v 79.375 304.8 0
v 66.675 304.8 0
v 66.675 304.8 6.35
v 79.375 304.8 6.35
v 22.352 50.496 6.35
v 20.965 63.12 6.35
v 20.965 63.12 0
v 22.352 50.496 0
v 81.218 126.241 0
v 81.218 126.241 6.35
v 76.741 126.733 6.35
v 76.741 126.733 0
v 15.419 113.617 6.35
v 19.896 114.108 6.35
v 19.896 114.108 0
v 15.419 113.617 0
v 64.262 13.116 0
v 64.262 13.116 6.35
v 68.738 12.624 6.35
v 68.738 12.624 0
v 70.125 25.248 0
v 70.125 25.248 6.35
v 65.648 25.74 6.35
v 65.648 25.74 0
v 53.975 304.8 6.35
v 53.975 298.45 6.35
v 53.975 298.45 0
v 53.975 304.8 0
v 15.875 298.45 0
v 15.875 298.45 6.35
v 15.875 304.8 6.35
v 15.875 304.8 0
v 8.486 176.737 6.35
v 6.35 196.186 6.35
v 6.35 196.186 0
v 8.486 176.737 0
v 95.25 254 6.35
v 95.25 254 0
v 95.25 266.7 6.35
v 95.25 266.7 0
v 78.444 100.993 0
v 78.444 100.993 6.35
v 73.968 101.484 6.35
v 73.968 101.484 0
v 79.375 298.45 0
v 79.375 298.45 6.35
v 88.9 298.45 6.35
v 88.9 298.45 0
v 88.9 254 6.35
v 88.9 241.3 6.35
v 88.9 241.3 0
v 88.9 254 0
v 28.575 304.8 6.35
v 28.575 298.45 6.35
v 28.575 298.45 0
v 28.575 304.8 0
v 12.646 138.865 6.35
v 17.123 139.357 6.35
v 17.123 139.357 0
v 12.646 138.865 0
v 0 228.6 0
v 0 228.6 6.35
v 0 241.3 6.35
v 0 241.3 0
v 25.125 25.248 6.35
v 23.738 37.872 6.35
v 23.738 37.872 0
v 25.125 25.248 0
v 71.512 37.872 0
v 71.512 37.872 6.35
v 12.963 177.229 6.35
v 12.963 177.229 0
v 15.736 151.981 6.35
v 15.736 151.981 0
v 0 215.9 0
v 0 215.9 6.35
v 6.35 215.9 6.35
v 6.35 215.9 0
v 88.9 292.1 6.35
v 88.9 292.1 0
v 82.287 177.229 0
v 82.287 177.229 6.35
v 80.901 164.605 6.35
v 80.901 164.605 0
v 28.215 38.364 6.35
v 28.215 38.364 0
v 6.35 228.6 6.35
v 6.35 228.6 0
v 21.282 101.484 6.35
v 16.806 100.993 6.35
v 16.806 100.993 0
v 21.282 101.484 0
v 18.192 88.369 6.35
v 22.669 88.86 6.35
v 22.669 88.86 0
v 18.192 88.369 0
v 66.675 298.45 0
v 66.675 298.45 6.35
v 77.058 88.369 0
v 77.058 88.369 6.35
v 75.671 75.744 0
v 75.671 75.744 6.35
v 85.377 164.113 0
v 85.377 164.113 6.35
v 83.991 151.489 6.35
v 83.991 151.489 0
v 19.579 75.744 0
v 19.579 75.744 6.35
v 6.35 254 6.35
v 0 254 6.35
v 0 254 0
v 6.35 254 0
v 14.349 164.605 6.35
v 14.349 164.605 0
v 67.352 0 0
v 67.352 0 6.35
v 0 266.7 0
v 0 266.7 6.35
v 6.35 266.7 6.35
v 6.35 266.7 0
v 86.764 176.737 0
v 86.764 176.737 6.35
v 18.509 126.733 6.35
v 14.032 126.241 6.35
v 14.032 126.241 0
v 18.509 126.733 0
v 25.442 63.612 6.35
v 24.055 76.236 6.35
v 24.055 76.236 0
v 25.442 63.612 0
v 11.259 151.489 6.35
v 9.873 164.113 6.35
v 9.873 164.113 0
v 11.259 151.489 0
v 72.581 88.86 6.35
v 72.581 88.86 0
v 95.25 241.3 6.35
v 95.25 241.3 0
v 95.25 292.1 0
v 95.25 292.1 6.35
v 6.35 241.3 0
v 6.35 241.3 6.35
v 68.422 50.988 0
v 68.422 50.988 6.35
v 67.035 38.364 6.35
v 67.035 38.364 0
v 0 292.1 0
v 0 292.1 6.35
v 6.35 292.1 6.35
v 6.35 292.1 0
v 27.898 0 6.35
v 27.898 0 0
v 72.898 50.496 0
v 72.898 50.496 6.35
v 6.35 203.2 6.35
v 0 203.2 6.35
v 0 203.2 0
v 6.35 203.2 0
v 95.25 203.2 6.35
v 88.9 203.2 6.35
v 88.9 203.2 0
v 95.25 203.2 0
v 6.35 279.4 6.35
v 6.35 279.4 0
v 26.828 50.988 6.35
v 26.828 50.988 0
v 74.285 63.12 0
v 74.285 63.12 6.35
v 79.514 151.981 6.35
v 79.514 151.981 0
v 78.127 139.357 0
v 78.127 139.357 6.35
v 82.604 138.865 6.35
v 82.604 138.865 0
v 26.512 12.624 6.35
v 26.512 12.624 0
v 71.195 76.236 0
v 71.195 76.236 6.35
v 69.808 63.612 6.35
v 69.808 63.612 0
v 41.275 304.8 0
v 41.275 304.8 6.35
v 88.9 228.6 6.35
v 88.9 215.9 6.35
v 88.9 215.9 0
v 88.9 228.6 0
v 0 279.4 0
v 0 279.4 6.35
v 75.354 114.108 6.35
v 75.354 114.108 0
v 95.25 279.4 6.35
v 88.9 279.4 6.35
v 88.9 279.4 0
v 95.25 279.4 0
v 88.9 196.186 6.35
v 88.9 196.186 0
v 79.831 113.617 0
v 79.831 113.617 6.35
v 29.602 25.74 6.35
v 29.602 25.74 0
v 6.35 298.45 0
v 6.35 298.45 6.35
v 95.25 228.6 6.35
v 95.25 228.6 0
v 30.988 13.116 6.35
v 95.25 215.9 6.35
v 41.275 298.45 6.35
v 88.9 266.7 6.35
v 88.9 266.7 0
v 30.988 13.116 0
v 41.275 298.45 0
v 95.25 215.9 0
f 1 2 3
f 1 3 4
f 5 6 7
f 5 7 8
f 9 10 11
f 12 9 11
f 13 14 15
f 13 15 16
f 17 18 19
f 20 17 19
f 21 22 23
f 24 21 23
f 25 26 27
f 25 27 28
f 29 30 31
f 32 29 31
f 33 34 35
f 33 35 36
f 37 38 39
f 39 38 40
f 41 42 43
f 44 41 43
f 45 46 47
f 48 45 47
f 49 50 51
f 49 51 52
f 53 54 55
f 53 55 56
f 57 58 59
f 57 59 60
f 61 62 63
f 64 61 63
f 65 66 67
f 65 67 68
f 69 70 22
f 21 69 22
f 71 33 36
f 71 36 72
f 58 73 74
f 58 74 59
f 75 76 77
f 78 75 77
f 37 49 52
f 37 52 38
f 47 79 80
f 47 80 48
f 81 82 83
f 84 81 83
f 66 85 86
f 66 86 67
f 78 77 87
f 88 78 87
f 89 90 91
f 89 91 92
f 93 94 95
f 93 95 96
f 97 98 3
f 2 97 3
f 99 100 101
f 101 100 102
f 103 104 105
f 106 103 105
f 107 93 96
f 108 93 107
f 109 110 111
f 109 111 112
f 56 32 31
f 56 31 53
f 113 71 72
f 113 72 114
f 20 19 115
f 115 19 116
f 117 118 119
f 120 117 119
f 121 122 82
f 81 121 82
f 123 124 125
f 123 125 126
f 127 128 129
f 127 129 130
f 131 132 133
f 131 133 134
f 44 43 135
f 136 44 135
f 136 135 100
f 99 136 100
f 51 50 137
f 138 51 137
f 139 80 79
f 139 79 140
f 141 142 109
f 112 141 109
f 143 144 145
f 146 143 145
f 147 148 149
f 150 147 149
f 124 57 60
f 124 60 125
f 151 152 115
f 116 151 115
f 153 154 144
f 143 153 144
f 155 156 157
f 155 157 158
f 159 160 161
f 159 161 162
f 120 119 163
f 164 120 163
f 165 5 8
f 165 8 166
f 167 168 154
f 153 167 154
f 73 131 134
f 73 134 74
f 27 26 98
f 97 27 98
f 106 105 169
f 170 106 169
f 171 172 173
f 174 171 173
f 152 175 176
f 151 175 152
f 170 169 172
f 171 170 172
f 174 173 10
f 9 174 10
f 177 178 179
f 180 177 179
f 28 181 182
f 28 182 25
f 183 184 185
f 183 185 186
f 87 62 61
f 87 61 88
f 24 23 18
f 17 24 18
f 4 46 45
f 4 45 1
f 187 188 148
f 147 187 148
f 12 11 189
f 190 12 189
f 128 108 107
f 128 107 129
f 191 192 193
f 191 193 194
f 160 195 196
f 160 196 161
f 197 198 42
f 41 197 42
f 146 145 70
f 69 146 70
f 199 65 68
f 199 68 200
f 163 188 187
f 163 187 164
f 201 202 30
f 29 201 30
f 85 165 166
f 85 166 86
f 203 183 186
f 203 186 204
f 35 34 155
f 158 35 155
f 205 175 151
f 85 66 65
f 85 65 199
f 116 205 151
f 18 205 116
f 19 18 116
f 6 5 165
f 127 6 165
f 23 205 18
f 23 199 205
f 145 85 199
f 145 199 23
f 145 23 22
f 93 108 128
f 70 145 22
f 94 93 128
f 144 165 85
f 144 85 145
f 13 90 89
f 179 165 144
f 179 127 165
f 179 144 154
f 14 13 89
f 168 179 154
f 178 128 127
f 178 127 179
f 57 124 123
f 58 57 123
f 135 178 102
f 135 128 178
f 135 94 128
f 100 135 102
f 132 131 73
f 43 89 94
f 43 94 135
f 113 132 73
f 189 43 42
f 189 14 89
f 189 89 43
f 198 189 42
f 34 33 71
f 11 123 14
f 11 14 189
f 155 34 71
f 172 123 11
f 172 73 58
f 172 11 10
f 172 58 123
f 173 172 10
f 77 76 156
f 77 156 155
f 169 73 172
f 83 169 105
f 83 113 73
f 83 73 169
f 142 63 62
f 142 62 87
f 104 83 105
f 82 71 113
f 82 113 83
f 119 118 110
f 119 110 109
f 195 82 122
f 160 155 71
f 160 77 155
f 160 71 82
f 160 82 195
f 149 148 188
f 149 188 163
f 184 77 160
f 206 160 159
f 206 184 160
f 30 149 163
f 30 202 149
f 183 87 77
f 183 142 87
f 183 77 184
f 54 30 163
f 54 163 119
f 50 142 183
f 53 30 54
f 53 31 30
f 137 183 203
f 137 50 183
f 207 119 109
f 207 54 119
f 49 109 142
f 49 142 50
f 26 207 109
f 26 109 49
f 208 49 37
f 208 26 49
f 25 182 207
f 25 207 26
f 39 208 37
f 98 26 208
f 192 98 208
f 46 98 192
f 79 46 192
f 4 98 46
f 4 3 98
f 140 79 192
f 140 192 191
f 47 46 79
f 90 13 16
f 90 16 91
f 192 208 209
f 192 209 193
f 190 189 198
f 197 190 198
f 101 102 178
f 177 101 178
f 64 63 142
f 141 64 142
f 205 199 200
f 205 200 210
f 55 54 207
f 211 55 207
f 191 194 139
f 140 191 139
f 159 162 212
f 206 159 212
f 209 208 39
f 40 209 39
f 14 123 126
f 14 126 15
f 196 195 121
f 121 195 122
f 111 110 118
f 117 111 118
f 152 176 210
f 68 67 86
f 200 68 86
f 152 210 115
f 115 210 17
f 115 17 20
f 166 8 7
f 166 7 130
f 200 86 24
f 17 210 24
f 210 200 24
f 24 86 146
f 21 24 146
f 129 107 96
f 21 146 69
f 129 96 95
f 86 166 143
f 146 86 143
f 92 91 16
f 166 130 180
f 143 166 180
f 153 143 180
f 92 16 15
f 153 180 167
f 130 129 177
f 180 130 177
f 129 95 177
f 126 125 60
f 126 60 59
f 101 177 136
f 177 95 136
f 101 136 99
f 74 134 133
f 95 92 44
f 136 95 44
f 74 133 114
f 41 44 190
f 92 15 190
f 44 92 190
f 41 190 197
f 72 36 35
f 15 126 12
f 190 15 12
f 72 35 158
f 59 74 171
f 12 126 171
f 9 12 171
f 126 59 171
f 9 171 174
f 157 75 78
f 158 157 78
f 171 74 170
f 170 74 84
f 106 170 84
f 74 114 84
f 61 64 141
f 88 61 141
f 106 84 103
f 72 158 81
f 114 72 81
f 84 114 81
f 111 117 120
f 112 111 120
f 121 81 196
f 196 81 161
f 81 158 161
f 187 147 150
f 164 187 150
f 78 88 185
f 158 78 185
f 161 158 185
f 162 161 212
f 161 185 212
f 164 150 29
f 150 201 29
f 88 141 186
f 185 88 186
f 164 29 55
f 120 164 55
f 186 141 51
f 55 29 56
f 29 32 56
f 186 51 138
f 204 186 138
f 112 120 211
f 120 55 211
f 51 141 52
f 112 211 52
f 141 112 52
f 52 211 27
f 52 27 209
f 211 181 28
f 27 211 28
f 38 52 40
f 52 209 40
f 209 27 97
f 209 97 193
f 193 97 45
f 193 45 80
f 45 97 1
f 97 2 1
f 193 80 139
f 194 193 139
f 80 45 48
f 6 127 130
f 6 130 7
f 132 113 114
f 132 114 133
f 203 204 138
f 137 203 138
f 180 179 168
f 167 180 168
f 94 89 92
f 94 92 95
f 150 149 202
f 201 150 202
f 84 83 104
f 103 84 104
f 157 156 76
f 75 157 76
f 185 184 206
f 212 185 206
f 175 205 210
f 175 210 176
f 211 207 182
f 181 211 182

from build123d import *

# Parameters (mm, degrees)
SKETCH1_W           = 95.25
SKETCH1_H           = 304.8
BOSS_EXTRUDE1_DEPTH = 6.35
CUT_EXTRUDE1_DEPTH  = 7.35
SKETCH3_W           = 6.35
SKETCH3_H           = 12.7
CUT_EXTRUDE2_DEPTH  = 7.35
SKETCH4_W           = 9.525
SKETCH4_H           = 6.35
SKETCH4_W_2         = 12.7
CUT_EXTRUDE3_DEPTH  = 7.35
CUT_EXTRUDE4_DEPTH  = 7.35
LPATTERN2_COUNT     = 7
LPATTERN2_PITCH     = 25.4
CUT_EXTRUDE5_DEPTH  = 7.35
LPATTERN3_COUNT     = 7
LPATTERN3_PITCH     = 25.4
SKETCH9_W           = 6.35
SKETCH9_H           = 57.814016323
BOSS_EXTRUDE2_DEPTH = 6.35
LPATTERN4_COUNT     = 5
LPATTERN4_PITCH     = 25.4


with BuildPart() as part:
    # Sketch1 → Boss-Extrude1 (new body)
    with BuildSketch(Plane.XY):
        with Locations((47.625, 152.4)):
            Rectangle(SKETCH1_W, SKETCH1_H)
    extrude(amount=BOSS_EXTRUDE1_DEPTH)

    # Sketch2 → Cut-Extrude1 (cut, through all)
    with BuildSketch(Plane.XY.offset(6.35)):
        Polygon((0, 254), (27.898079092, 0), (0, 0), align=None)
        Polygon((67.351920908, 0), (95.25, 0), (95.25, 254), align=None)
    extrude(amount=-CUT_EXTRUDE1_DEPTH, mode=Mode.SUBTRACT)

    # Sketch3 → Cut-Extrude2 (cut, through all)
    with BuildSketch(Plane.XY.offset(6.35)):
        with Locations((3.175, 298.45)):
            Rectangle(SKETCH3_W, SKETCH3_H)
        with Locations((92.075, 298.45)):
            Rectangle(SKETCH3_W, SKETCH3_H)
    cut_extrude2 = extrude(amount=-CUT_EXTRUDE2_DEPTH, mode=Mode.SUBTRACT)

    # Sketch4 → Cut-Extrude3 (cut, through all)
    with BuildSketch(Plane.XY.offset(6.35)):
        with Locations((11.1125, 301.625)):
            Rectangle(SKETCH4_W, SKETCH4_H)
        with Locations((34.925, 301.625)):
            Rectangle(SKETCH4_W_2, SKETCH4_H)
        with Locations((60.325, 301.625)):
            Rectangle(SKETCH4_W_2, SKETCH4_H)
        with Locations((84.1375, 301.625)):
            Rectangle(SKETCH4_W, SKETCH4_H)
    extrude(amount=-CUT_EXTRUDE3_DEPTH, mode=Mode.SUBTRACT)

    # Sketch5 → Cut-Extrude4 (cut, through all)
    with BuildSketch(Plane.XY.offset(6.35)):
        Polygon((26.511513632, 12.624081599), (25.124948171, 25.248163198), (29.601595278, 25.739855541), (30.988160739, 13.115773942), align=None)
    cut_extrude4 = extrude(amount=-CUT_EXTRUDE4_DEPTH, mode=Mode.SUBTRACT)

    # LPattern2: Cut-Extrude4 ×7
    with Locations(*[Vector(-0.109178383, 0.994022173, 0) * (i * LPATTERN2_PITCH) for i in range(1, LPATTERN2_COUNT)]):
        add(cut_extrude4, mode=Mode.SUBTRACT)

    # Sketch6 → Cut-Extrude5 (cut, through all)
    with BuildSketch(Plane.XY.offset(6.35)):
        Polygon((68.738486368, 12.624081599), (70.125051829, 25.248163198), (65.648404722, 25.739855541), (64.261839261, 13.115773942), align=None)
    cut_extrude5 = extrude(amount=-CUT_EXTRUDE5_DEPTH, mode=Mode.SUBTRACT)

    # LPattern3: Cut-Extrude5 ×7
    with Locations(*[Vector(0.109178383, 0.994022173, 0) * (i * LPATTERN3_PITCH) for i in range(1, LPATTERN3_COUNT)]):
        add(cut_extrude5, mode=Mode.SUBTRACT)

    # Sketch9 → Boss-Extrude2 (add, through all)
    with BuildSketch(Plane.XY.offset(6.35)):
        with Locations((3.175, 225.092991839)):
            Rectangle(SKETCH9_W, SKETCH9_H)
        with Locations((92.075, 225.092991839)):
            Rectangle(SKETCH9_W, SKETCH9_H)
    extrude(amount=-BOSS_EXTRUDE2_DEPTH)

    # LPattern4: Cut-Extrude2 ×5
    with Locations(*[(0, -i * LPATTERN4_PITCH, 0) for i in range(1, LPATTERN4_COUNT)]):
        add(cut_extrude2, mode=Mode.SUBTRACT)


solid = part.part
